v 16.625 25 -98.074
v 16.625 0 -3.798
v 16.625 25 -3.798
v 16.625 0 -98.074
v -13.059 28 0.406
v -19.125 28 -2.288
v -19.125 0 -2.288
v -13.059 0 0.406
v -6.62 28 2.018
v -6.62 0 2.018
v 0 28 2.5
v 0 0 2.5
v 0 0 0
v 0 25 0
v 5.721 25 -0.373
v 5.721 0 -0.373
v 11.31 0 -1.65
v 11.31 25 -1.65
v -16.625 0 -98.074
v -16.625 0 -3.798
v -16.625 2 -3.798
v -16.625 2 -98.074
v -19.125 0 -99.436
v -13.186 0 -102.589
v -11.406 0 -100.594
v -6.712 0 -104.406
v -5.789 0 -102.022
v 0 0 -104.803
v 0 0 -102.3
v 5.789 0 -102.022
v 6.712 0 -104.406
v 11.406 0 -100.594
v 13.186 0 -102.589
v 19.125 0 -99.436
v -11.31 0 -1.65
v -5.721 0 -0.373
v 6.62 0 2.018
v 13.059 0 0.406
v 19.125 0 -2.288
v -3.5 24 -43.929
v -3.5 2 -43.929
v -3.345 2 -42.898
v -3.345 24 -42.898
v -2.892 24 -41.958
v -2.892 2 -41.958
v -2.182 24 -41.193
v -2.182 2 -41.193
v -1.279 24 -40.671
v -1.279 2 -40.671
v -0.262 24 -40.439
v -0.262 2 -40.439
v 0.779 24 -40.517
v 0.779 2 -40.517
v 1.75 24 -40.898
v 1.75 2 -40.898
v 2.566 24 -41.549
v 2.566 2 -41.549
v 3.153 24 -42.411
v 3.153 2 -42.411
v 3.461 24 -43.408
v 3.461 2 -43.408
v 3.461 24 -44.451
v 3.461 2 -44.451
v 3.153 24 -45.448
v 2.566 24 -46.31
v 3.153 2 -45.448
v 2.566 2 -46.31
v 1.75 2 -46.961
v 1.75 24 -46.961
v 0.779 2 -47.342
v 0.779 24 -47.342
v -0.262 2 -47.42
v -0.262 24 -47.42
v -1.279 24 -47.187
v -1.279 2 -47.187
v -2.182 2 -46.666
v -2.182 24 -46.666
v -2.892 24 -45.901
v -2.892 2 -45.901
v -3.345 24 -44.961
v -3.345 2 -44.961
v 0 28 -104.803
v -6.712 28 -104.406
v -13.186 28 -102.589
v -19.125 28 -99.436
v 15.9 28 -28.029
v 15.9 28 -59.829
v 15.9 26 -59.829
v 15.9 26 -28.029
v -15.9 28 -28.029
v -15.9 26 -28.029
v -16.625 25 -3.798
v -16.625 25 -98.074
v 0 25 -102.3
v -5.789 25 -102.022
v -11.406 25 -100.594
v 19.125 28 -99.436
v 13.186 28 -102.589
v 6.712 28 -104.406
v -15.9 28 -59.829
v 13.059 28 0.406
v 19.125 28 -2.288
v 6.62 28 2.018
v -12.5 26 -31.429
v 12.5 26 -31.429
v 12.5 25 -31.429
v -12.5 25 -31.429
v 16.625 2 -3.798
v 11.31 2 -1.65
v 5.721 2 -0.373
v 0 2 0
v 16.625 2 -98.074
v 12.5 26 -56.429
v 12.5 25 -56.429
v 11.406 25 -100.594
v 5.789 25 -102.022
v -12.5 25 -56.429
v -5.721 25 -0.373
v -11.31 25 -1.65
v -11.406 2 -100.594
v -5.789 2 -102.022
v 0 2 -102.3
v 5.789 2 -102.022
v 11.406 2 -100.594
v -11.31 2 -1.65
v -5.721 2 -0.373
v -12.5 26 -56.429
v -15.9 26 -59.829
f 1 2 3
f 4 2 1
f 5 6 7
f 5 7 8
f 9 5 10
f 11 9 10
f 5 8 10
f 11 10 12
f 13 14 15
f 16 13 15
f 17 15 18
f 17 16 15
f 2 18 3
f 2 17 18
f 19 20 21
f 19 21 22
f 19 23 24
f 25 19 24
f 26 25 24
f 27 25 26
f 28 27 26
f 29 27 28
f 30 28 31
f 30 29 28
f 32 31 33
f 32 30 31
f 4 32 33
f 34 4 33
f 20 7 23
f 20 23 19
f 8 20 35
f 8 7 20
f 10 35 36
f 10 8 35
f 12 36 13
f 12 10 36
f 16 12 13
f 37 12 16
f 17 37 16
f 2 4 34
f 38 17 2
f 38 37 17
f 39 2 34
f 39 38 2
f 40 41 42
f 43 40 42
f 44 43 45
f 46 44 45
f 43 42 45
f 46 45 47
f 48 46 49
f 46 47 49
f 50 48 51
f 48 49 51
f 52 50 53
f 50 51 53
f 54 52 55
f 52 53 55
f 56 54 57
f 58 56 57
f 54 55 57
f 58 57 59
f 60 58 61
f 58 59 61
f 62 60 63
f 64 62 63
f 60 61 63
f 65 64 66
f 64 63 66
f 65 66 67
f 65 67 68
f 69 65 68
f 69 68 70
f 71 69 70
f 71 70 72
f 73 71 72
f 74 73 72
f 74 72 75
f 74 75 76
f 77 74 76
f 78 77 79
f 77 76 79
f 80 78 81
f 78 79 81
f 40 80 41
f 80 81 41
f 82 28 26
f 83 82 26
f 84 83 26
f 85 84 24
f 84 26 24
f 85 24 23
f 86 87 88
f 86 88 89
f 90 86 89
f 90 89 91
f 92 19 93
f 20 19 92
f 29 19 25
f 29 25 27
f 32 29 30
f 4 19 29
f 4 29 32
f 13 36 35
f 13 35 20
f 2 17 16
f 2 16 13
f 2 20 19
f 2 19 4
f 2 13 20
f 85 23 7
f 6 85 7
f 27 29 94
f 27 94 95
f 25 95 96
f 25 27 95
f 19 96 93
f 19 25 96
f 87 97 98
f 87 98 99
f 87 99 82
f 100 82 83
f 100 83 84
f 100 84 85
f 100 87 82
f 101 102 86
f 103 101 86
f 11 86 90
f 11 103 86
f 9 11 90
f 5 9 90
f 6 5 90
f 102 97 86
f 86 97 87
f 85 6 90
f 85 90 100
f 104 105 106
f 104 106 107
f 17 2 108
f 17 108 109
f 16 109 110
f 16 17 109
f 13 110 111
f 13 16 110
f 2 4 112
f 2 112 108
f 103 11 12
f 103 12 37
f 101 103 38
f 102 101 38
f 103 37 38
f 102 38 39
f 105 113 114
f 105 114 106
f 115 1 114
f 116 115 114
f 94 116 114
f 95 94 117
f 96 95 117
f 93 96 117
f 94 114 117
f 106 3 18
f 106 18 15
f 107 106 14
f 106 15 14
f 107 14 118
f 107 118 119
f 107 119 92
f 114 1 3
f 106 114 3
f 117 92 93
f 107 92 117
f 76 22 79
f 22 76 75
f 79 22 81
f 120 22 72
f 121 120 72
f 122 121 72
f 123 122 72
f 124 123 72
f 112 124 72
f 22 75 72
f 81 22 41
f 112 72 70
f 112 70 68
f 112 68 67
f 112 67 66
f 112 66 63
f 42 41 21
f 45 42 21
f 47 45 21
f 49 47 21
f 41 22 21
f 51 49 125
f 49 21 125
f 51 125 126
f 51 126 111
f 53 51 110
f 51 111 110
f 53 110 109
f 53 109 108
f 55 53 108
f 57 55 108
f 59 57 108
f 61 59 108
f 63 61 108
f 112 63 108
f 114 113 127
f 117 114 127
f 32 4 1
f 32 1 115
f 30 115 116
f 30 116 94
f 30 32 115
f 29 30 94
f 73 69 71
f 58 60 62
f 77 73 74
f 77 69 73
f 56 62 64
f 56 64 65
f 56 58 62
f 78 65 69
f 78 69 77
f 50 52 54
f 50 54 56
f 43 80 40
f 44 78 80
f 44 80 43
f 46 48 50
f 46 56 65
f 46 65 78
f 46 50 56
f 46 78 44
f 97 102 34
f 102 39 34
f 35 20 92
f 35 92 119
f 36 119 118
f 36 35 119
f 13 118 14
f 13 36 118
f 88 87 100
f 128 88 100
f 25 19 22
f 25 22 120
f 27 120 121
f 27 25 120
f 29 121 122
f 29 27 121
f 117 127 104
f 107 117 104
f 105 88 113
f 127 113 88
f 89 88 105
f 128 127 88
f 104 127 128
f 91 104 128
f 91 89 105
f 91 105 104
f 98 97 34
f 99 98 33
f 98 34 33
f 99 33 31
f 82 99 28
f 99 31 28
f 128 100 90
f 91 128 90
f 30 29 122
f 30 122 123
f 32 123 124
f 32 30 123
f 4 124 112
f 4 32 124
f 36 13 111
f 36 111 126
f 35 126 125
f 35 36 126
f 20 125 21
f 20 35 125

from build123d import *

# Parameters (mm, degrees)
F2_DEPTH  = 2
F3_R      = 3.5
F4_DEPTH  = 22
F6_DEPTH  = 25
F8_DEPTH  = 3
F9_W      = 25
F9_H      = 25
F10_DEPTH = 3
F11_W     = 31.8
F11_H     = 31.8
F11_W_2   = 25
F11_H_2   = 25
F12_DEPTH = 2


with BuildPart() as f2:
    # F1 (on Front) → F2 (new body)
    with BuildSketch(Plane.XZ):
        with BuildLine():
            Line((16.625, -98.074324), (16.625, -3.797799))
            ThreePointArc((16.625, -3.797799), (8.540624, -0.900281), (0, 0))
            ThreePointArc((0, 0), (-8.540624, -0.900281), (-16.625, -3.797799))
            Line((-16.625, -3.797799), (-16.625, -98.074324))
            ThreePointArc((-16.625, -98.074324), (-8.633199, -101.44888), (0, -102.299997))
            ThreePointArc((0, -102.299997), (8.633199, -101.44888), (16.625, -98.074324))
        make_face()
    extrude(amount=-F2_DEPTH)

    # F3 (on face) → F4 (join)
    with BuildSketch(Plane(origin=(0, 2, 0), x_dir=(-1, 0, 0), z_dir=(0, 1, 0))):
        with Locations((0, -43.929432)):
            Circle(F3_R)
    extrude(amount=F4_DEPTH)


with BuildPart() as f6:
    # F5 (on face) → F6 (new body)
    with BuildSketch(Plane.XZ):
        with BuildLine():
            ThreePointArc((0, -104.803155), (9.998027, -103.671593), (19.125, -99.436105))
            Line((19.125, -99.436105), (19.125, -2.288207))
            ThreePointArc((19.125, -2.288207), (9.874208, 1.350978), (0, 2.500247))
            ThreePointArc((0, 2.500247), (-9.874208, 1.350978), (-19.125, -2.288207))
            Line((-19.125, -2.288207), (-19.125, -99.436105))
            ThreePointArc((-19.125, -99.436105), (-9.998027, -103.671593), (0, -104.803155))
        make_face()
        with BuildLine():
            ThreePointArc((16.625, -98.074324), (8.633199, -101.44888), (0, -102.299997))
            ThreePointArc((0, -102.299997), (-8.633199, -101.44888), (-16.625, -98.074324))
            Line((-16.625, -98.074324), (-16.625, -3.797799))
            ThreePointArc((-16.625, -3.797799), (-8.540624, -0.900281), (0, 0))
            ThreePointArc((0, 0), (8.540624, -0.900281), (16.625, -3.797799))
            Line((16.625, -3.797799), (16.625, -98.074324))
        make_face(mode=Mode.SUBTRACT)
    extrude(amount=-F6_DEPTH)

    # F7 (on face) → F8 (join)
    with BuildSketch(Plane(origin=(0, 25, 0), x_dir=(-1, 0, 0), z_dir=(0, 1, 0))):
        with BuildLine():
            ThreePointArc((19.125, -2.288207), (9.874208, 1.350978), (0, 2.500247))
            ThreePointArc((0, 2.500247), (-9.874208, 1.350978), (-19.125, -2.288207))
            Line((-19.125, -2.288207), (-19.125, -99.436105))
            ThreePointArc((-19.125, -99.436105), (-9.998027, -103.671593), (0, -104.803155))
            ThreePointArc((0, -104.803155), (9.998027, -103.671593), (19.125, -99.436105))
            Line((19.125, -99.436105), (19.125, -2.288207))
        make_face()
    extrude(amount=F8_DEPTH)

    # F9 (on face) → F10 (cut)
    with BuildSketch(Plane(origin=(0, 28, 0), x_dir=(-1, 0, 0), z_dir=(0, 1, 0))):
        with Locations((0, -43.929432)):
            Rectangle(F9_W, F9_H)
    extrude(amount=-F10_DEPTH, mode=Mode.SUBTRACT)

    # F11 (on face) → F12 (cut)
    with BuildSketch(Plane(origin=(0, 28, 0), x_dir=(-1, 0, 0), z_dir=(0, 1, 0))):
        with Locations((0, -43.929432)):
            Rectangle(F11_W, F11_H)
        with Locations((0, -43.929432)):
            Rectangle(F11_W_2, F11_H_2, mode=Mode.SUBTRACT)
    extrude(amount=-F12_DEPTH, mode=Mode.SUBTRACT)


solid = Compound([f2.part, f6.part])
